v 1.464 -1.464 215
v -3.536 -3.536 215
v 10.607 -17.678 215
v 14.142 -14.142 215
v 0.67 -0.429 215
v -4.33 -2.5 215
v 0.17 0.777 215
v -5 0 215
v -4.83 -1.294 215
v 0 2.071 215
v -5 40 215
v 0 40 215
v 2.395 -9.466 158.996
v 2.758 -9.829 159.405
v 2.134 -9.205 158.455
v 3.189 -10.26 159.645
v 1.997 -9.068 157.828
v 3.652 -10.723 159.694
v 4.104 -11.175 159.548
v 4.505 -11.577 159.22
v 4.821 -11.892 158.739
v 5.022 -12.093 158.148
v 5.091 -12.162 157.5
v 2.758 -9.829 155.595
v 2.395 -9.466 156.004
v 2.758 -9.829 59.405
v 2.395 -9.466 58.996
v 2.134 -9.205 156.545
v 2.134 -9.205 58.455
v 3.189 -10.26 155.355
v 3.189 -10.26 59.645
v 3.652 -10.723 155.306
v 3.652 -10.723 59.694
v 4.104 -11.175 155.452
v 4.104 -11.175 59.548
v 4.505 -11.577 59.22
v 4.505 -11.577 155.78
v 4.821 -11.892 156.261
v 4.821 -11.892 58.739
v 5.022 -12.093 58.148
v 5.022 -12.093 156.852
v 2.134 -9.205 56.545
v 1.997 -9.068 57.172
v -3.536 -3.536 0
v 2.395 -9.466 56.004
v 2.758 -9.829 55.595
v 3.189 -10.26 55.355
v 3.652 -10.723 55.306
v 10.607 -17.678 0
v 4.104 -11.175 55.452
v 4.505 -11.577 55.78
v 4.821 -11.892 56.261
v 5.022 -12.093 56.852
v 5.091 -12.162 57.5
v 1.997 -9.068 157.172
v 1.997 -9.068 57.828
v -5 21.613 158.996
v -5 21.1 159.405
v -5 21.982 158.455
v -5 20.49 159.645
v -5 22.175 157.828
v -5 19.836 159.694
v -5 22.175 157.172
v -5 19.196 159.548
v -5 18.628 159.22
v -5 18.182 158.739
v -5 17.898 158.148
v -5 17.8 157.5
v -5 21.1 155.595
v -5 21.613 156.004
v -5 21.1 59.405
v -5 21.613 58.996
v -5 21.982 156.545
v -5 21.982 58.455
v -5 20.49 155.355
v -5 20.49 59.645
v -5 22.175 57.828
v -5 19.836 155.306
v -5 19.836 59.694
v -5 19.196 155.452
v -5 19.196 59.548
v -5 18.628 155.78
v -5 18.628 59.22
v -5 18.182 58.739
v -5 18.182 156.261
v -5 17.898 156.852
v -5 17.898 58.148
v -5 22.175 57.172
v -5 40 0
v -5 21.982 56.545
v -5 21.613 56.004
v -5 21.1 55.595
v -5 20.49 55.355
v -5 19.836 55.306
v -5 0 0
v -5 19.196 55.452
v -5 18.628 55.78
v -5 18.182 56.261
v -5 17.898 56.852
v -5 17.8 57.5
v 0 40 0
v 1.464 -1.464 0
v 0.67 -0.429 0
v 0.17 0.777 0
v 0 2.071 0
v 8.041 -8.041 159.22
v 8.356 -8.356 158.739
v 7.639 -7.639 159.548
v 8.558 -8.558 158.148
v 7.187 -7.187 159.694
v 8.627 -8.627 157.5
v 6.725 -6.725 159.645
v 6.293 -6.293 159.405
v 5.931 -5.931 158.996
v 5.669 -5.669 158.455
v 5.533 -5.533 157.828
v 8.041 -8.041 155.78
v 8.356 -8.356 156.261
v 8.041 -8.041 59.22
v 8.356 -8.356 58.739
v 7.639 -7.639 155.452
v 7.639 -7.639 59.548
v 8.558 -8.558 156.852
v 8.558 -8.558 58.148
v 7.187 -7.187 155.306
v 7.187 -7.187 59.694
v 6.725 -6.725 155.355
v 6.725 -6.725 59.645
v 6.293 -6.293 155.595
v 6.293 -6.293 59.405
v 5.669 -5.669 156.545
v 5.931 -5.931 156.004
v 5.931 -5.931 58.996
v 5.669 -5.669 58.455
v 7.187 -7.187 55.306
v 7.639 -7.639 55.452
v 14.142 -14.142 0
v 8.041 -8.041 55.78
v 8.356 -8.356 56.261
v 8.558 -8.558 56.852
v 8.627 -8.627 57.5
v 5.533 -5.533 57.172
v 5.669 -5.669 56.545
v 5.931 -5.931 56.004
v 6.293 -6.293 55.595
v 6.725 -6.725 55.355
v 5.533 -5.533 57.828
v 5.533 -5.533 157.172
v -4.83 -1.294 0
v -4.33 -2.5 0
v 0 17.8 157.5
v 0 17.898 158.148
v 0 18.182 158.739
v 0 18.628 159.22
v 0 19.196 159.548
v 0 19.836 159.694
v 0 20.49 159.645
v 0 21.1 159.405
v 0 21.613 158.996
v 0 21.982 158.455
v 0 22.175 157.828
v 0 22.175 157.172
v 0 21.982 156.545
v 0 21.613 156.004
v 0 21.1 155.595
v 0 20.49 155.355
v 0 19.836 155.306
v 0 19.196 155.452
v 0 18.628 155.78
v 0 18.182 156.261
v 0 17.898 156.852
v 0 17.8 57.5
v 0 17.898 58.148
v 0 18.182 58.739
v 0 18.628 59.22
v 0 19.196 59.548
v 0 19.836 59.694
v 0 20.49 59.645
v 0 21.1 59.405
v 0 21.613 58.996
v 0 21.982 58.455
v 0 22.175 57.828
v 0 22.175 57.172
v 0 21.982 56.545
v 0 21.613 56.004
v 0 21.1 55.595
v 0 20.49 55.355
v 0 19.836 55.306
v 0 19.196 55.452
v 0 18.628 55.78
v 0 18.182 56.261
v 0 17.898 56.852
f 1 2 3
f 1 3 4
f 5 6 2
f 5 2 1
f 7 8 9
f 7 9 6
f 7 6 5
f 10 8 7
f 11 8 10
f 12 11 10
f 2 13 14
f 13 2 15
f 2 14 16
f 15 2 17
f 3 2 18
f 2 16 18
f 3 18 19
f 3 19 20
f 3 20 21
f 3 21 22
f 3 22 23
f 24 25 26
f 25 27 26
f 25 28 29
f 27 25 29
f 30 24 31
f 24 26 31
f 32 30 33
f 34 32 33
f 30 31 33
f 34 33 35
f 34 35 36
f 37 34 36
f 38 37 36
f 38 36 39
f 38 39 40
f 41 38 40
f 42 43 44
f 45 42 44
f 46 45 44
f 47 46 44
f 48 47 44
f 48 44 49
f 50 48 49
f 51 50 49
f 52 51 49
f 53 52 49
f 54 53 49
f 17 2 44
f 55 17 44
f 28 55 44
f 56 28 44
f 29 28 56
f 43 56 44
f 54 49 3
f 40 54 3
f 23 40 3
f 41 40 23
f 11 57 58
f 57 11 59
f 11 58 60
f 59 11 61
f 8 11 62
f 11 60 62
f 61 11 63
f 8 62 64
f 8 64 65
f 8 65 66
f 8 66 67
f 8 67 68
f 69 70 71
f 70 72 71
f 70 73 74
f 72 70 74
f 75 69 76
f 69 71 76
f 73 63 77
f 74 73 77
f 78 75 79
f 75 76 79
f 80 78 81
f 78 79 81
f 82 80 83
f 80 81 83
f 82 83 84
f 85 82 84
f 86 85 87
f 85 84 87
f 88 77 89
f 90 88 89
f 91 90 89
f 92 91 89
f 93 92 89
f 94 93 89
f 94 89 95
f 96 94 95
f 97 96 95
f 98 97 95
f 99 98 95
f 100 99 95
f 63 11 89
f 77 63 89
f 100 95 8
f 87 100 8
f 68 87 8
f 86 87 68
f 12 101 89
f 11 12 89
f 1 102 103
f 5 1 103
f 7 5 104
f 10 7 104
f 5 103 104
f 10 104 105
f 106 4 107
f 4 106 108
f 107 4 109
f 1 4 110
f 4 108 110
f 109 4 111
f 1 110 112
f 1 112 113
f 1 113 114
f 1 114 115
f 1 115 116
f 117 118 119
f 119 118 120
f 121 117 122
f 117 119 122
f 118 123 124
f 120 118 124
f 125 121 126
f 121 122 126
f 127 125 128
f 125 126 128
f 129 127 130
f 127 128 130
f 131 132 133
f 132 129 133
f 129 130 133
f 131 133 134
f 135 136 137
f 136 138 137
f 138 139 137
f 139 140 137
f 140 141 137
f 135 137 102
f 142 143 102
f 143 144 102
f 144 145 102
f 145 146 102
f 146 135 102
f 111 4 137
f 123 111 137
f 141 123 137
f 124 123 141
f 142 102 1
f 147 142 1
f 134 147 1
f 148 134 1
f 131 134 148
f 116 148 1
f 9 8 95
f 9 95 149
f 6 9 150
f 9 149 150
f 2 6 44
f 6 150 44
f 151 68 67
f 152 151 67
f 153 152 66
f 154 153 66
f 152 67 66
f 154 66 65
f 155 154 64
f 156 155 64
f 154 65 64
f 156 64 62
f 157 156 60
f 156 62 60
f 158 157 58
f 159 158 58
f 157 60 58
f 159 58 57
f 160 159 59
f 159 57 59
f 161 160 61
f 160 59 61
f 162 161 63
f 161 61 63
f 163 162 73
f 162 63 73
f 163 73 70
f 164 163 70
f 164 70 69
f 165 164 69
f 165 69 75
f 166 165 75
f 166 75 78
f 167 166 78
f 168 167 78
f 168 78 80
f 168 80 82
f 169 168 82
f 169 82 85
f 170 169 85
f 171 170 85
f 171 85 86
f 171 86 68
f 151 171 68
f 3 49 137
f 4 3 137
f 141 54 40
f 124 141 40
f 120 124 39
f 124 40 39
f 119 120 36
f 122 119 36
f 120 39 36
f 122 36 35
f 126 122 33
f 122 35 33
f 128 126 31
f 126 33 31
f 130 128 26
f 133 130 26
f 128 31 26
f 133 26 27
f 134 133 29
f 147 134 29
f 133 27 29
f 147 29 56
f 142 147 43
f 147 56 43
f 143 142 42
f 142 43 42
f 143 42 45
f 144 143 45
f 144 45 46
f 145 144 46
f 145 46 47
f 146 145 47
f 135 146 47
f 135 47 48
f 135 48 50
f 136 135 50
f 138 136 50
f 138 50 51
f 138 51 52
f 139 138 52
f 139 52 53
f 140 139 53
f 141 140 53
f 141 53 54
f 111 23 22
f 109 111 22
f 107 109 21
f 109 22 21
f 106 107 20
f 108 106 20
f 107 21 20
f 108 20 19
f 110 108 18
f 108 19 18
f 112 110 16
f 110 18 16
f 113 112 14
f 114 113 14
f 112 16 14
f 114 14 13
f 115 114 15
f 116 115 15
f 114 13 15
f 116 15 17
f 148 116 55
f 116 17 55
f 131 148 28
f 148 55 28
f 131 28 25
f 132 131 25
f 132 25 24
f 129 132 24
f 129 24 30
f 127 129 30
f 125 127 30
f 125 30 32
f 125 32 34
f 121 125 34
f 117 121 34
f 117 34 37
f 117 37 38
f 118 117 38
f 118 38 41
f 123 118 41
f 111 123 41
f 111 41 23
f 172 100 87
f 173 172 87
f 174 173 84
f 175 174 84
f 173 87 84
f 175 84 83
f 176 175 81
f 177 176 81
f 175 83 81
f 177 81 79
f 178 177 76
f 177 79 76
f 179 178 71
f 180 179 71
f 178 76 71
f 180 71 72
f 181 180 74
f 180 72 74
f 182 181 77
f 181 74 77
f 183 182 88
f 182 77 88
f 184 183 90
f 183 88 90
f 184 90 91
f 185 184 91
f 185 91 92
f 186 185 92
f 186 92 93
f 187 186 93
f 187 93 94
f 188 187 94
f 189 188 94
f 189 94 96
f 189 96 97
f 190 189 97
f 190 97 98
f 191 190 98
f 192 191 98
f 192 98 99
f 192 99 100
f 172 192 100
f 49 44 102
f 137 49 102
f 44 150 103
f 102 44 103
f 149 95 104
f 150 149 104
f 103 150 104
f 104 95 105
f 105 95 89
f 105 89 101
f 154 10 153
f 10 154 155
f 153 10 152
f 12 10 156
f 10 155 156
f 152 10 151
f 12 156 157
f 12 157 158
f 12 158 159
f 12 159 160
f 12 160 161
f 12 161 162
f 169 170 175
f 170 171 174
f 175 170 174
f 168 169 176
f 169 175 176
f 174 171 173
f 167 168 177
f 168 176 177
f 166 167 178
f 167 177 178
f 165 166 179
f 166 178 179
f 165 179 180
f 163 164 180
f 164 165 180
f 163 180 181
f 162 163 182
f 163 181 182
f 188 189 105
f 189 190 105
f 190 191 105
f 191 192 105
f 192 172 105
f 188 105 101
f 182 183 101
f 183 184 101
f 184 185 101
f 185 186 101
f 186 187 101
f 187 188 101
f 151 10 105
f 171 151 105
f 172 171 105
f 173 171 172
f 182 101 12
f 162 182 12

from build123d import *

# Parameters (mm, degrees)
F1_DEPTH = 215
F3_D     = 4.4
F5_D     = 4.4


with BuildPart() as f1:
    # F0 (on Top) → F1 (new body)
    with BuildSketch(Plane.XY):
        with BuildLine():
            Line((0, 2.0710678119), (0, 40))
            Line((0, 40), (-5, 40))
            Line((-5, 40), (-5, 0))
            ThreePointArc((-5, 0), (-4.6193976626, -1.9134171618), (-3.5355339059, -3.5355339059))
            Line((-3.5355339059, -3.5355339059), (10.6066017178, -17.6776695297))
            Line((10.6066017178, -17.6776695297), (14.1421356237, -14.1421356237))
            Line((14.1421356237, -14.1421356237), (1.4644660941, -1.4644660941))
            ThreePointArc((1.4644660941, -1.4644660941), (0.3806023374, 0.15765065), (0, 2.0710678119))
        make_face()
    extrude(amount=F1_DEPTH)

    # F3 (through all)
    with Locations(Plane.YZ):
        with Locations((20, 157.5), (20, 57.5)):
            Hole(F3_D / 2)

    # F5 (through all)
    with Locations(Plane(origin=(0, 0, 0), x_dir=(-0.7071067812, 0.7071067812, 0), z_dir=(0.7071067812, 0.7071067812, 0))):
        with Locations((-10, 157.5), (-10, 57.5)):
            Hole(F5_D / 2)


solid = f1.part
